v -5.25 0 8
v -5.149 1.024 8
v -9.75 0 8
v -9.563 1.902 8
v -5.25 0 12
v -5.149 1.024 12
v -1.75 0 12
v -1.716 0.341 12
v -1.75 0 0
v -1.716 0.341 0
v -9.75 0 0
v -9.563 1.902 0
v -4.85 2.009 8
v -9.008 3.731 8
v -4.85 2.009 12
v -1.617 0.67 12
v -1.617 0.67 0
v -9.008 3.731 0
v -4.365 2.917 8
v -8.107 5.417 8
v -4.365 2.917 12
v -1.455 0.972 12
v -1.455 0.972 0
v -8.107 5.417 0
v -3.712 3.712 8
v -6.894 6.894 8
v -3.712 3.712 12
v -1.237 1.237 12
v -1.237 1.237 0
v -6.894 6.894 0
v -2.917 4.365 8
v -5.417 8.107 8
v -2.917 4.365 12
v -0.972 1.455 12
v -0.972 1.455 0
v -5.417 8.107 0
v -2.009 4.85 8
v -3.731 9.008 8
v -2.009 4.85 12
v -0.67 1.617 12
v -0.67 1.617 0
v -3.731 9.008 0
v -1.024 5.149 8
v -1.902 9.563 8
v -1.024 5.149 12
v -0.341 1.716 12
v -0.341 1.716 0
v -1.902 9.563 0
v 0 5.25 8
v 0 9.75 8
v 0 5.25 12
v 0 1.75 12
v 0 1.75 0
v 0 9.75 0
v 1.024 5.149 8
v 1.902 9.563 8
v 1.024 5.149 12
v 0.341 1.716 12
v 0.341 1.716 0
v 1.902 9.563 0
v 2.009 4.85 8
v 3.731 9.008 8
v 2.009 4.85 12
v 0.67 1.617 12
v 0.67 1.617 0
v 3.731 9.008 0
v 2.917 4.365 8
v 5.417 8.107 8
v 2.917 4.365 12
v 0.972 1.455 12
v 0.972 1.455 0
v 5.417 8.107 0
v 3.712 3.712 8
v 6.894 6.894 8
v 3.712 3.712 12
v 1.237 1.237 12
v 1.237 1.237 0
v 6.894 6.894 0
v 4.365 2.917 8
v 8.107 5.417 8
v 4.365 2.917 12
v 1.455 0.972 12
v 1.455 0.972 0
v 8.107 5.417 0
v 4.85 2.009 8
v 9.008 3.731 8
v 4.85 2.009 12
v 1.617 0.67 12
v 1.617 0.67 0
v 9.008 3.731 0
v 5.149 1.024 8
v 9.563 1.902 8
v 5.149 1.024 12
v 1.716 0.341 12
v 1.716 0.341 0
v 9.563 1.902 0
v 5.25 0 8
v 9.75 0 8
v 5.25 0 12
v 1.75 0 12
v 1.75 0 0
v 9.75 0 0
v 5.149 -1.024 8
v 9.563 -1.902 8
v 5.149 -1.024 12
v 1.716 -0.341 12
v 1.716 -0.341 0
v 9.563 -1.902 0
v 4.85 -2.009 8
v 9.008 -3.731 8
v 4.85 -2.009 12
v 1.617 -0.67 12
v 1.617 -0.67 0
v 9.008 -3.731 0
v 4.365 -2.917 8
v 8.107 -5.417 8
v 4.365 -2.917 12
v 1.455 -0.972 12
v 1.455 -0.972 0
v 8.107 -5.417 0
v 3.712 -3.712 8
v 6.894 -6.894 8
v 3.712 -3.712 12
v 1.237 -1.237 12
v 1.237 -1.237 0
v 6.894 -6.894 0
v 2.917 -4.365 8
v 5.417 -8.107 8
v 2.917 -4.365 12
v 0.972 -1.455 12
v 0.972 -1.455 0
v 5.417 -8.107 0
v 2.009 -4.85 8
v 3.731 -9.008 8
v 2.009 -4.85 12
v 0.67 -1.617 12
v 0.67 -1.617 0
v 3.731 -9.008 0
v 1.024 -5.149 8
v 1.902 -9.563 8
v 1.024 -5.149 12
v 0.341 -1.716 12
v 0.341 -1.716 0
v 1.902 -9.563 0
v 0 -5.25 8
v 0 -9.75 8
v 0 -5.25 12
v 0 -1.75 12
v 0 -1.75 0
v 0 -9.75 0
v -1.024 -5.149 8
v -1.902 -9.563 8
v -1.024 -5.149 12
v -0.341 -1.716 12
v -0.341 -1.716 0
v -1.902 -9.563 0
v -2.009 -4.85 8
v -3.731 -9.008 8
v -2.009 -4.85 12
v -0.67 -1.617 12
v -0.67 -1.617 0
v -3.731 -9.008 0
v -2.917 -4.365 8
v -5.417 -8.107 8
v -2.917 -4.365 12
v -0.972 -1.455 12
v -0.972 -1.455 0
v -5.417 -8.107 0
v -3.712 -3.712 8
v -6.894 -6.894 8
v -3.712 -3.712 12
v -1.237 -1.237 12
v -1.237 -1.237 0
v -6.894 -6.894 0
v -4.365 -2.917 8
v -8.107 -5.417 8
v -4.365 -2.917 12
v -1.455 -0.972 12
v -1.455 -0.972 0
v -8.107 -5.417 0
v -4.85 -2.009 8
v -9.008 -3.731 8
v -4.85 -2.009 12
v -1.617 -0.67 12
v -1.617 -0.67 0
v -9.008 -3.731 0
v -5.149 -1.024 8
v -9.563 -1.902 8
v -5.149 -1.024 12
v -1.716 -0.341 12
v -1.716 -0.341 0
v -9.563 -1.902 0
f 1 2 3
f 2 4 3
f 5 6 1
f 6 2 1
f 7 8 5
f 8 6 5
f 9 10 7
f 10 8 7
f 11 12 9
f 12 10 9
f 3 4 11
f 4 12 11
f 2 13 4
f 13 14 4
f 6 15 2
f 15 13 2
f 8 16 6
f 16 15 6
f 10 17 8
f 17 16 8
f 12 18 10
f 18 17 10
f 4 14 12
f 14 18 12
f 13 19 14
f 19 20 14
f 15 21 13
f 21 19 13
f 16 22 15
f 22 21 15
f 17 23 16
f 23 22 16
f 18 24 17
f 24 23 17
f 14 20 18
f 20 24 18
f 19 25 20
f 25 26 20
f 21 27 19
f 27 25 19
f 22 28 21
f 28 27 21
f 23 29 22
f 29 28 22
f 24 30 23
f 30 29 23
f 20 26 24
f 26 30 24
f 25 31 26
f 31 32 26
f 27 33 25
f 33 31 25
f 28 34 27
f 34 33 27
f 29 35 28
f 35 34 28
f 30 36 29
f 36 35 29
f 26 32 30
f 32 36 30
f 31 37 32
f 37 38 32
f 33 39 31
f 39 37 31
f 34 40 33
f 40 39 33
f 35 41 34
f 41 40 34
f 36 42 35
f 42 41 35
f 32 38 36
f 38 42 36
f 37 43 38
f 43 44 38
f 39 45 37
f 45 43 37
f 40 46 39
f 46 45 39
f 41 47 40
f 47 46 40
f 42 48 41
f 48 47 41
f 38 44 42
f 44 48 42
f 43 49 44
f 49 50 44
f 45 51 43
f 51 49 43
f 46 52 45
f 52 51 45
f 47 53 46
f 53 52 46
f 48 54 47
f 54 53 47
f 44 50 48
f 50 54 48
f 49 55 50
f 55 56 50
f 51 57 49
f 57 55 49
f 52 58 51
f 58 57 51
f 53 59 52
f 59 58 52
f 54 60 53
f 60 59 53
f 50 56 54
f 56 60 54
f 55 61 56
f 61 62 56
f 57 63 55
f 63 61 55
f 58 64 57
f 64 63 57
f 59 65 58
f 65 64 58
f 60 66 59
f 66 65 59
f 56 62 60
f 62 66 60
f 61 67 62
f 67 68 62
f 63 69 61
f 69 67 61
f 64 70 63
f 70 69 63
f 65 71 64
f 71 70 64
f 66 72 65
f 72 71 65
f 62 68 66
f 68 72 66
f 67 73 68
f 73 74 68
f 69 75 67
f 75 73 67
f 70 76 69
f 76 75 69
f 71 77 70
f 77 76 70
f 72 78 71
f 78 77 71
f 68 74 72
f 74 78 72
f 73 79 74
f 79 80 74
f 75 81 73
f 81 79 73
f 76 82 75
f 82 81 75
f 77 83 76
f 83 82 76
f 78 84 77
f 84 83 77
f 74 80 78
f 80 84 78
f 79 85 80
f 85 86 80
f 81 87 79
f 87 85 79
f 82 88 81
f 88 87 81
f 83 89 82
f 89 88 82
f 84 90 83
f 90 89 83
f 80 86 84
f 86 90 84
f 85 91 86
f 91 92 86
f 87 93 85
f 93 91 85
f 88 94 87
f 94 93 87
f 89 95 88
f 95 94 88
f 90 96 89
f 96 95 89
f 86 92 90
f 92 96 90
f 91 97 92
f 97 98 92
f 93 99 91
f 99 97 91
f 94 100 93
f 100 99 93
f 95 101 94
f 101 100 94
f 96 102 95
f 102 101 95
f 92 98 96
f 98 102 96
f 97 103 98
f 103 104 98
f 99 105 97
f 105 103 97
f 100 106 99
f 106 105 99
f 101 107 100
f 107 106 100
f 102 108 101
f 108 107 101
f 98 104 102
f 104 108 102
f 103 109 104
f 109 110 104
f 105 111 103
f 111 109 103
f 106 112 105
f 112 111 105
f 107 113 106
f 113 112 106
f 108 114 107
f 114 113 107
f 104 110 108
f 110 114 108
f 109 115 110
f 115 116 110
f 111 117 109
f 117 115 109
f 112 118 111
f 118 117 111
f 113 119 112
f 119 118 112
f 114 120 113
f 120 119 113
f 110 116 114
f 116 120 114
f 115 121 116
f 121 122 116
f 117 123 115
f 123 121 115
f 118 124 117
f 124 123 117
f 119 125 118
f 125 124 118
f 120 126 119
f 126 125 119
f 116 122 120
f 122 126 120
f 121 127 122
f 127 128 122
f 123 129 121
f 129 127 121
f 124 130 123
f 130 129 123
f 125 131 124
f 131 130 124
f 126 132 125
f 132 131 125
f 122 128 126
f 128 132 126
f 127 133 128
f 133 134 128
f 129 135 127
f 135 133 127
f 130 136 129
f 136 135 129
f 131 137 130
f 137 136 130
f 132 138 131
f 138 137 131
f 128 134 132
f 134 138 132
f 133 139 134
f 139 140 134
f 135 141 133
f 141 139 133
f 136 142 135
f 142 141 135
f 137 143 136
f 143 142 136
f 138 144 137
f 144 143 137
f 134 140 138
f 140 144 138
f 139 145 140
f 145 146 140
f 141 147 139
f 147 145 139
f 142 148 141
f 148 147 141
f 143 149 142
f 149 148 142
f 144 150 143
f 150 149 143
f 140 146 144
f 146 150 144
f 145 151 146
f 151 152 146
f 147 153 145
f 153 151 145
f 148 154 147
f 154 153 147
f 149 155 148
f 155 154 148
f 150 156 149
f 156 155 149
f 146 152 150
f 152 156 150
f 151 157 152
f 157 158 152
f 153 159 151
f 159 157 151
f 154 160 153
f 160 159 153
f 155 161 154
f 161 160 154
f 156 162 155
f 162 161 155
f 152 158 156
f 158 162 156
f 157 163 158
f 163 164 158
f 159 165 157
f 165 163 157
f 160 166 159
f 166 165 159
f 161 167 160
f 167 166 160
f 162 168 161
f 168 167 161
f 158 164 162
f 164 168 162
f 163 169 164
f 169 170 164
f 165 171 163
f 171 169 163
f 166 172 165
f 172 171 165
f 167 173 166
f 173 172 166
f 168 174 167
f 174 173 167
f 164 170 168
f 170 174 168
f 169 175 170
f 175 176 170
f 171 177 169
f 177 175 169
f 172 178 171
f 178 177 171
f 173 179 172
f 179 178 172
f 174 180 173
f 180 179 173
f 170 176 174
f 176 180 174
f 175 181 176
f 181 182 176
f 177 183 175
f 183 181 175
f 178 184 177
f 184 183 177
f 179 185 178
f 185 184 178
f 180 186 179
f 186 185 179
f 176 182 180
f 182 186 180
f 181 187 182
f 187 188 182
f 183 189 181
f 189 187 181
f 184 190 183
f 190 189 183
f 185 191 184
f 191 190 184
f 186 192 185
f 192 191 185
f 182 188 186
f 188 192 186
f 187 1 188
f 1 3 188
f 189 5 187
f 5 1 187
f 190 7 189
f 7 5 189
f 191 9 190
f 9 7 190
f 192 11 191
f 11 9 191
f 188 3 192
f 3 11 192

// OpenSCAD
$fn = 32;

// ----------------------------------------------------------------------
// Form washer: stepped_c washer, 19.5 mm outside, 3.5 mm bore
// ----------------------------------------------------------------------

// --- parameters (mm) ---
revolve_angle = 360;      // full turn around the Z axis
profile_points = 6;       // points of the closed outline

profile = [[1.75, 0], [9.75, 0], [9.75, 8], [5.25, 8], [5.25, 12], [1.75, 12]];  // single closed polygon, 6 points, counter clockwise

// --- the one profile operation ---
rotate_extrude(angle = revolve_angle) polygon(points = profile);
